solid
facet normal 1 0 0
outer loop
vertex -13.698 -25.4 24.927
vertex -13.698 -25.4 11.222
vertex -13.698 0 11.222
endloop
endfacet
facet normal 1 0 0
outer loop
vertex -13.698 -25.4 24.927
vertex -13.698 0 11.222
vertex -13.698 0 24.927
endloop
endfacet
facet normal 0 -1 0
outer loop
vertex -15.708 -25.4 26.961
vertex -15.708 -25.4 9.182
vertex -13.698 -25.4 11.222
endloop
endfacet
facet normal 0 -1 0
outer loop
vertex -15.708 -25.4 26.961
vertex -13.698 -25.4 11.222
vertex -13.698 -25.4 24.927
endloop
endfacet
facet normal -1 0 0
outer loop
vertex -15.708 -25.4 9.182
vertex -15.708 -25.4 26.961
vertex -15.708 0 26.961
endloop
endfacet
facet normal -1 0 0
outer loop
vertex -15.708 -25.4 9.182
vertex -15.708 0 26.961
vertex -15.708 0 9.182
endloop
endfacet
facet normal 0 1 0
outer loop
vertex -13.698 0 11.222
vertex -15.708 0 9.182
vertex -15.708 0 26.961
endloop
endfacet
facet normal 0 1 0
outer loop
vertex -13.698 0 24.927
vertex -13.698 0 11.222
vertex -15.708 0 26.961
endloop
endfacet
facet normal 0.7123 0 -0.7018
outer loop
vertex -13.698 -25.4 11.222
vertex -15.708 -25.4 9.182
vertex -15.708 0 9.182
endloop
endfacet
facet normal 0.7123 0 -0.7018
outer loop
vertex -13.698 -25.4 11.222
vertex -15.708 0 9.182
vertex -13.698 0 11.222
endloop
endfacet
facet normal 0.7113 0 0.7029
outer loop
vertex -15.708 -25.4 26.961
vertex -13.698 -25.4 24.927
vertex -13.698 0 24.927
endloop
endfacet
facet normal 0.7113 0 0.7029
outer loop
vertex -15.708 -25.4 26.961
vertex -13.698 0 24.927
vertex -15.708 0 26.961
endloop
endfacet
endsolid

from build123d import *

# Parameters (mm, degrees)
F0_W     = 2.0093368366
F0_H     = 6.8891588598
F1_DEPTH = 25.4
F2_W     = 2.0093368366
F2_H     = 6.8161971867
F3_DEPTH = 25.4
F5_DEPTH = 25.4


with BuildPart() as f1:
    # F0 (on Front) → F1 (new body)
    with BuildSketch(Plane.XZ):
        with Locations((-14.7031224333, 14.6663570777)):
            Rectangle(F0_W, F0_H)
    extrude(amount=F1_DEPTH)

    # F2 (on face) → F3 (join)
    with BuildSketch(Plane.XZ.offset(25.4)):
        with Locations((-14.7031224333, 21.5190351009)):
            Rectangle(F2_W, F2_H)
    extrude(amount=-F3_DEPTH)

    # F4 (on face) → F5 (join)
    with BuildSketch(Plane.XZ.offset(25.4)):
        Polygon((-15.7077908516, 26.9609466195), (-15.7077908516, 24.9271336943), (-13.698454015, 24.9271336943), align=None)
        Polygon((-13.698454015, 11.2217776477), (-15.7077908516, 11.2217776477), (-15.7077908516, 9.18235071), align=None)
    extrude(amount=-F5_DEPTH)


solid = f1.part
